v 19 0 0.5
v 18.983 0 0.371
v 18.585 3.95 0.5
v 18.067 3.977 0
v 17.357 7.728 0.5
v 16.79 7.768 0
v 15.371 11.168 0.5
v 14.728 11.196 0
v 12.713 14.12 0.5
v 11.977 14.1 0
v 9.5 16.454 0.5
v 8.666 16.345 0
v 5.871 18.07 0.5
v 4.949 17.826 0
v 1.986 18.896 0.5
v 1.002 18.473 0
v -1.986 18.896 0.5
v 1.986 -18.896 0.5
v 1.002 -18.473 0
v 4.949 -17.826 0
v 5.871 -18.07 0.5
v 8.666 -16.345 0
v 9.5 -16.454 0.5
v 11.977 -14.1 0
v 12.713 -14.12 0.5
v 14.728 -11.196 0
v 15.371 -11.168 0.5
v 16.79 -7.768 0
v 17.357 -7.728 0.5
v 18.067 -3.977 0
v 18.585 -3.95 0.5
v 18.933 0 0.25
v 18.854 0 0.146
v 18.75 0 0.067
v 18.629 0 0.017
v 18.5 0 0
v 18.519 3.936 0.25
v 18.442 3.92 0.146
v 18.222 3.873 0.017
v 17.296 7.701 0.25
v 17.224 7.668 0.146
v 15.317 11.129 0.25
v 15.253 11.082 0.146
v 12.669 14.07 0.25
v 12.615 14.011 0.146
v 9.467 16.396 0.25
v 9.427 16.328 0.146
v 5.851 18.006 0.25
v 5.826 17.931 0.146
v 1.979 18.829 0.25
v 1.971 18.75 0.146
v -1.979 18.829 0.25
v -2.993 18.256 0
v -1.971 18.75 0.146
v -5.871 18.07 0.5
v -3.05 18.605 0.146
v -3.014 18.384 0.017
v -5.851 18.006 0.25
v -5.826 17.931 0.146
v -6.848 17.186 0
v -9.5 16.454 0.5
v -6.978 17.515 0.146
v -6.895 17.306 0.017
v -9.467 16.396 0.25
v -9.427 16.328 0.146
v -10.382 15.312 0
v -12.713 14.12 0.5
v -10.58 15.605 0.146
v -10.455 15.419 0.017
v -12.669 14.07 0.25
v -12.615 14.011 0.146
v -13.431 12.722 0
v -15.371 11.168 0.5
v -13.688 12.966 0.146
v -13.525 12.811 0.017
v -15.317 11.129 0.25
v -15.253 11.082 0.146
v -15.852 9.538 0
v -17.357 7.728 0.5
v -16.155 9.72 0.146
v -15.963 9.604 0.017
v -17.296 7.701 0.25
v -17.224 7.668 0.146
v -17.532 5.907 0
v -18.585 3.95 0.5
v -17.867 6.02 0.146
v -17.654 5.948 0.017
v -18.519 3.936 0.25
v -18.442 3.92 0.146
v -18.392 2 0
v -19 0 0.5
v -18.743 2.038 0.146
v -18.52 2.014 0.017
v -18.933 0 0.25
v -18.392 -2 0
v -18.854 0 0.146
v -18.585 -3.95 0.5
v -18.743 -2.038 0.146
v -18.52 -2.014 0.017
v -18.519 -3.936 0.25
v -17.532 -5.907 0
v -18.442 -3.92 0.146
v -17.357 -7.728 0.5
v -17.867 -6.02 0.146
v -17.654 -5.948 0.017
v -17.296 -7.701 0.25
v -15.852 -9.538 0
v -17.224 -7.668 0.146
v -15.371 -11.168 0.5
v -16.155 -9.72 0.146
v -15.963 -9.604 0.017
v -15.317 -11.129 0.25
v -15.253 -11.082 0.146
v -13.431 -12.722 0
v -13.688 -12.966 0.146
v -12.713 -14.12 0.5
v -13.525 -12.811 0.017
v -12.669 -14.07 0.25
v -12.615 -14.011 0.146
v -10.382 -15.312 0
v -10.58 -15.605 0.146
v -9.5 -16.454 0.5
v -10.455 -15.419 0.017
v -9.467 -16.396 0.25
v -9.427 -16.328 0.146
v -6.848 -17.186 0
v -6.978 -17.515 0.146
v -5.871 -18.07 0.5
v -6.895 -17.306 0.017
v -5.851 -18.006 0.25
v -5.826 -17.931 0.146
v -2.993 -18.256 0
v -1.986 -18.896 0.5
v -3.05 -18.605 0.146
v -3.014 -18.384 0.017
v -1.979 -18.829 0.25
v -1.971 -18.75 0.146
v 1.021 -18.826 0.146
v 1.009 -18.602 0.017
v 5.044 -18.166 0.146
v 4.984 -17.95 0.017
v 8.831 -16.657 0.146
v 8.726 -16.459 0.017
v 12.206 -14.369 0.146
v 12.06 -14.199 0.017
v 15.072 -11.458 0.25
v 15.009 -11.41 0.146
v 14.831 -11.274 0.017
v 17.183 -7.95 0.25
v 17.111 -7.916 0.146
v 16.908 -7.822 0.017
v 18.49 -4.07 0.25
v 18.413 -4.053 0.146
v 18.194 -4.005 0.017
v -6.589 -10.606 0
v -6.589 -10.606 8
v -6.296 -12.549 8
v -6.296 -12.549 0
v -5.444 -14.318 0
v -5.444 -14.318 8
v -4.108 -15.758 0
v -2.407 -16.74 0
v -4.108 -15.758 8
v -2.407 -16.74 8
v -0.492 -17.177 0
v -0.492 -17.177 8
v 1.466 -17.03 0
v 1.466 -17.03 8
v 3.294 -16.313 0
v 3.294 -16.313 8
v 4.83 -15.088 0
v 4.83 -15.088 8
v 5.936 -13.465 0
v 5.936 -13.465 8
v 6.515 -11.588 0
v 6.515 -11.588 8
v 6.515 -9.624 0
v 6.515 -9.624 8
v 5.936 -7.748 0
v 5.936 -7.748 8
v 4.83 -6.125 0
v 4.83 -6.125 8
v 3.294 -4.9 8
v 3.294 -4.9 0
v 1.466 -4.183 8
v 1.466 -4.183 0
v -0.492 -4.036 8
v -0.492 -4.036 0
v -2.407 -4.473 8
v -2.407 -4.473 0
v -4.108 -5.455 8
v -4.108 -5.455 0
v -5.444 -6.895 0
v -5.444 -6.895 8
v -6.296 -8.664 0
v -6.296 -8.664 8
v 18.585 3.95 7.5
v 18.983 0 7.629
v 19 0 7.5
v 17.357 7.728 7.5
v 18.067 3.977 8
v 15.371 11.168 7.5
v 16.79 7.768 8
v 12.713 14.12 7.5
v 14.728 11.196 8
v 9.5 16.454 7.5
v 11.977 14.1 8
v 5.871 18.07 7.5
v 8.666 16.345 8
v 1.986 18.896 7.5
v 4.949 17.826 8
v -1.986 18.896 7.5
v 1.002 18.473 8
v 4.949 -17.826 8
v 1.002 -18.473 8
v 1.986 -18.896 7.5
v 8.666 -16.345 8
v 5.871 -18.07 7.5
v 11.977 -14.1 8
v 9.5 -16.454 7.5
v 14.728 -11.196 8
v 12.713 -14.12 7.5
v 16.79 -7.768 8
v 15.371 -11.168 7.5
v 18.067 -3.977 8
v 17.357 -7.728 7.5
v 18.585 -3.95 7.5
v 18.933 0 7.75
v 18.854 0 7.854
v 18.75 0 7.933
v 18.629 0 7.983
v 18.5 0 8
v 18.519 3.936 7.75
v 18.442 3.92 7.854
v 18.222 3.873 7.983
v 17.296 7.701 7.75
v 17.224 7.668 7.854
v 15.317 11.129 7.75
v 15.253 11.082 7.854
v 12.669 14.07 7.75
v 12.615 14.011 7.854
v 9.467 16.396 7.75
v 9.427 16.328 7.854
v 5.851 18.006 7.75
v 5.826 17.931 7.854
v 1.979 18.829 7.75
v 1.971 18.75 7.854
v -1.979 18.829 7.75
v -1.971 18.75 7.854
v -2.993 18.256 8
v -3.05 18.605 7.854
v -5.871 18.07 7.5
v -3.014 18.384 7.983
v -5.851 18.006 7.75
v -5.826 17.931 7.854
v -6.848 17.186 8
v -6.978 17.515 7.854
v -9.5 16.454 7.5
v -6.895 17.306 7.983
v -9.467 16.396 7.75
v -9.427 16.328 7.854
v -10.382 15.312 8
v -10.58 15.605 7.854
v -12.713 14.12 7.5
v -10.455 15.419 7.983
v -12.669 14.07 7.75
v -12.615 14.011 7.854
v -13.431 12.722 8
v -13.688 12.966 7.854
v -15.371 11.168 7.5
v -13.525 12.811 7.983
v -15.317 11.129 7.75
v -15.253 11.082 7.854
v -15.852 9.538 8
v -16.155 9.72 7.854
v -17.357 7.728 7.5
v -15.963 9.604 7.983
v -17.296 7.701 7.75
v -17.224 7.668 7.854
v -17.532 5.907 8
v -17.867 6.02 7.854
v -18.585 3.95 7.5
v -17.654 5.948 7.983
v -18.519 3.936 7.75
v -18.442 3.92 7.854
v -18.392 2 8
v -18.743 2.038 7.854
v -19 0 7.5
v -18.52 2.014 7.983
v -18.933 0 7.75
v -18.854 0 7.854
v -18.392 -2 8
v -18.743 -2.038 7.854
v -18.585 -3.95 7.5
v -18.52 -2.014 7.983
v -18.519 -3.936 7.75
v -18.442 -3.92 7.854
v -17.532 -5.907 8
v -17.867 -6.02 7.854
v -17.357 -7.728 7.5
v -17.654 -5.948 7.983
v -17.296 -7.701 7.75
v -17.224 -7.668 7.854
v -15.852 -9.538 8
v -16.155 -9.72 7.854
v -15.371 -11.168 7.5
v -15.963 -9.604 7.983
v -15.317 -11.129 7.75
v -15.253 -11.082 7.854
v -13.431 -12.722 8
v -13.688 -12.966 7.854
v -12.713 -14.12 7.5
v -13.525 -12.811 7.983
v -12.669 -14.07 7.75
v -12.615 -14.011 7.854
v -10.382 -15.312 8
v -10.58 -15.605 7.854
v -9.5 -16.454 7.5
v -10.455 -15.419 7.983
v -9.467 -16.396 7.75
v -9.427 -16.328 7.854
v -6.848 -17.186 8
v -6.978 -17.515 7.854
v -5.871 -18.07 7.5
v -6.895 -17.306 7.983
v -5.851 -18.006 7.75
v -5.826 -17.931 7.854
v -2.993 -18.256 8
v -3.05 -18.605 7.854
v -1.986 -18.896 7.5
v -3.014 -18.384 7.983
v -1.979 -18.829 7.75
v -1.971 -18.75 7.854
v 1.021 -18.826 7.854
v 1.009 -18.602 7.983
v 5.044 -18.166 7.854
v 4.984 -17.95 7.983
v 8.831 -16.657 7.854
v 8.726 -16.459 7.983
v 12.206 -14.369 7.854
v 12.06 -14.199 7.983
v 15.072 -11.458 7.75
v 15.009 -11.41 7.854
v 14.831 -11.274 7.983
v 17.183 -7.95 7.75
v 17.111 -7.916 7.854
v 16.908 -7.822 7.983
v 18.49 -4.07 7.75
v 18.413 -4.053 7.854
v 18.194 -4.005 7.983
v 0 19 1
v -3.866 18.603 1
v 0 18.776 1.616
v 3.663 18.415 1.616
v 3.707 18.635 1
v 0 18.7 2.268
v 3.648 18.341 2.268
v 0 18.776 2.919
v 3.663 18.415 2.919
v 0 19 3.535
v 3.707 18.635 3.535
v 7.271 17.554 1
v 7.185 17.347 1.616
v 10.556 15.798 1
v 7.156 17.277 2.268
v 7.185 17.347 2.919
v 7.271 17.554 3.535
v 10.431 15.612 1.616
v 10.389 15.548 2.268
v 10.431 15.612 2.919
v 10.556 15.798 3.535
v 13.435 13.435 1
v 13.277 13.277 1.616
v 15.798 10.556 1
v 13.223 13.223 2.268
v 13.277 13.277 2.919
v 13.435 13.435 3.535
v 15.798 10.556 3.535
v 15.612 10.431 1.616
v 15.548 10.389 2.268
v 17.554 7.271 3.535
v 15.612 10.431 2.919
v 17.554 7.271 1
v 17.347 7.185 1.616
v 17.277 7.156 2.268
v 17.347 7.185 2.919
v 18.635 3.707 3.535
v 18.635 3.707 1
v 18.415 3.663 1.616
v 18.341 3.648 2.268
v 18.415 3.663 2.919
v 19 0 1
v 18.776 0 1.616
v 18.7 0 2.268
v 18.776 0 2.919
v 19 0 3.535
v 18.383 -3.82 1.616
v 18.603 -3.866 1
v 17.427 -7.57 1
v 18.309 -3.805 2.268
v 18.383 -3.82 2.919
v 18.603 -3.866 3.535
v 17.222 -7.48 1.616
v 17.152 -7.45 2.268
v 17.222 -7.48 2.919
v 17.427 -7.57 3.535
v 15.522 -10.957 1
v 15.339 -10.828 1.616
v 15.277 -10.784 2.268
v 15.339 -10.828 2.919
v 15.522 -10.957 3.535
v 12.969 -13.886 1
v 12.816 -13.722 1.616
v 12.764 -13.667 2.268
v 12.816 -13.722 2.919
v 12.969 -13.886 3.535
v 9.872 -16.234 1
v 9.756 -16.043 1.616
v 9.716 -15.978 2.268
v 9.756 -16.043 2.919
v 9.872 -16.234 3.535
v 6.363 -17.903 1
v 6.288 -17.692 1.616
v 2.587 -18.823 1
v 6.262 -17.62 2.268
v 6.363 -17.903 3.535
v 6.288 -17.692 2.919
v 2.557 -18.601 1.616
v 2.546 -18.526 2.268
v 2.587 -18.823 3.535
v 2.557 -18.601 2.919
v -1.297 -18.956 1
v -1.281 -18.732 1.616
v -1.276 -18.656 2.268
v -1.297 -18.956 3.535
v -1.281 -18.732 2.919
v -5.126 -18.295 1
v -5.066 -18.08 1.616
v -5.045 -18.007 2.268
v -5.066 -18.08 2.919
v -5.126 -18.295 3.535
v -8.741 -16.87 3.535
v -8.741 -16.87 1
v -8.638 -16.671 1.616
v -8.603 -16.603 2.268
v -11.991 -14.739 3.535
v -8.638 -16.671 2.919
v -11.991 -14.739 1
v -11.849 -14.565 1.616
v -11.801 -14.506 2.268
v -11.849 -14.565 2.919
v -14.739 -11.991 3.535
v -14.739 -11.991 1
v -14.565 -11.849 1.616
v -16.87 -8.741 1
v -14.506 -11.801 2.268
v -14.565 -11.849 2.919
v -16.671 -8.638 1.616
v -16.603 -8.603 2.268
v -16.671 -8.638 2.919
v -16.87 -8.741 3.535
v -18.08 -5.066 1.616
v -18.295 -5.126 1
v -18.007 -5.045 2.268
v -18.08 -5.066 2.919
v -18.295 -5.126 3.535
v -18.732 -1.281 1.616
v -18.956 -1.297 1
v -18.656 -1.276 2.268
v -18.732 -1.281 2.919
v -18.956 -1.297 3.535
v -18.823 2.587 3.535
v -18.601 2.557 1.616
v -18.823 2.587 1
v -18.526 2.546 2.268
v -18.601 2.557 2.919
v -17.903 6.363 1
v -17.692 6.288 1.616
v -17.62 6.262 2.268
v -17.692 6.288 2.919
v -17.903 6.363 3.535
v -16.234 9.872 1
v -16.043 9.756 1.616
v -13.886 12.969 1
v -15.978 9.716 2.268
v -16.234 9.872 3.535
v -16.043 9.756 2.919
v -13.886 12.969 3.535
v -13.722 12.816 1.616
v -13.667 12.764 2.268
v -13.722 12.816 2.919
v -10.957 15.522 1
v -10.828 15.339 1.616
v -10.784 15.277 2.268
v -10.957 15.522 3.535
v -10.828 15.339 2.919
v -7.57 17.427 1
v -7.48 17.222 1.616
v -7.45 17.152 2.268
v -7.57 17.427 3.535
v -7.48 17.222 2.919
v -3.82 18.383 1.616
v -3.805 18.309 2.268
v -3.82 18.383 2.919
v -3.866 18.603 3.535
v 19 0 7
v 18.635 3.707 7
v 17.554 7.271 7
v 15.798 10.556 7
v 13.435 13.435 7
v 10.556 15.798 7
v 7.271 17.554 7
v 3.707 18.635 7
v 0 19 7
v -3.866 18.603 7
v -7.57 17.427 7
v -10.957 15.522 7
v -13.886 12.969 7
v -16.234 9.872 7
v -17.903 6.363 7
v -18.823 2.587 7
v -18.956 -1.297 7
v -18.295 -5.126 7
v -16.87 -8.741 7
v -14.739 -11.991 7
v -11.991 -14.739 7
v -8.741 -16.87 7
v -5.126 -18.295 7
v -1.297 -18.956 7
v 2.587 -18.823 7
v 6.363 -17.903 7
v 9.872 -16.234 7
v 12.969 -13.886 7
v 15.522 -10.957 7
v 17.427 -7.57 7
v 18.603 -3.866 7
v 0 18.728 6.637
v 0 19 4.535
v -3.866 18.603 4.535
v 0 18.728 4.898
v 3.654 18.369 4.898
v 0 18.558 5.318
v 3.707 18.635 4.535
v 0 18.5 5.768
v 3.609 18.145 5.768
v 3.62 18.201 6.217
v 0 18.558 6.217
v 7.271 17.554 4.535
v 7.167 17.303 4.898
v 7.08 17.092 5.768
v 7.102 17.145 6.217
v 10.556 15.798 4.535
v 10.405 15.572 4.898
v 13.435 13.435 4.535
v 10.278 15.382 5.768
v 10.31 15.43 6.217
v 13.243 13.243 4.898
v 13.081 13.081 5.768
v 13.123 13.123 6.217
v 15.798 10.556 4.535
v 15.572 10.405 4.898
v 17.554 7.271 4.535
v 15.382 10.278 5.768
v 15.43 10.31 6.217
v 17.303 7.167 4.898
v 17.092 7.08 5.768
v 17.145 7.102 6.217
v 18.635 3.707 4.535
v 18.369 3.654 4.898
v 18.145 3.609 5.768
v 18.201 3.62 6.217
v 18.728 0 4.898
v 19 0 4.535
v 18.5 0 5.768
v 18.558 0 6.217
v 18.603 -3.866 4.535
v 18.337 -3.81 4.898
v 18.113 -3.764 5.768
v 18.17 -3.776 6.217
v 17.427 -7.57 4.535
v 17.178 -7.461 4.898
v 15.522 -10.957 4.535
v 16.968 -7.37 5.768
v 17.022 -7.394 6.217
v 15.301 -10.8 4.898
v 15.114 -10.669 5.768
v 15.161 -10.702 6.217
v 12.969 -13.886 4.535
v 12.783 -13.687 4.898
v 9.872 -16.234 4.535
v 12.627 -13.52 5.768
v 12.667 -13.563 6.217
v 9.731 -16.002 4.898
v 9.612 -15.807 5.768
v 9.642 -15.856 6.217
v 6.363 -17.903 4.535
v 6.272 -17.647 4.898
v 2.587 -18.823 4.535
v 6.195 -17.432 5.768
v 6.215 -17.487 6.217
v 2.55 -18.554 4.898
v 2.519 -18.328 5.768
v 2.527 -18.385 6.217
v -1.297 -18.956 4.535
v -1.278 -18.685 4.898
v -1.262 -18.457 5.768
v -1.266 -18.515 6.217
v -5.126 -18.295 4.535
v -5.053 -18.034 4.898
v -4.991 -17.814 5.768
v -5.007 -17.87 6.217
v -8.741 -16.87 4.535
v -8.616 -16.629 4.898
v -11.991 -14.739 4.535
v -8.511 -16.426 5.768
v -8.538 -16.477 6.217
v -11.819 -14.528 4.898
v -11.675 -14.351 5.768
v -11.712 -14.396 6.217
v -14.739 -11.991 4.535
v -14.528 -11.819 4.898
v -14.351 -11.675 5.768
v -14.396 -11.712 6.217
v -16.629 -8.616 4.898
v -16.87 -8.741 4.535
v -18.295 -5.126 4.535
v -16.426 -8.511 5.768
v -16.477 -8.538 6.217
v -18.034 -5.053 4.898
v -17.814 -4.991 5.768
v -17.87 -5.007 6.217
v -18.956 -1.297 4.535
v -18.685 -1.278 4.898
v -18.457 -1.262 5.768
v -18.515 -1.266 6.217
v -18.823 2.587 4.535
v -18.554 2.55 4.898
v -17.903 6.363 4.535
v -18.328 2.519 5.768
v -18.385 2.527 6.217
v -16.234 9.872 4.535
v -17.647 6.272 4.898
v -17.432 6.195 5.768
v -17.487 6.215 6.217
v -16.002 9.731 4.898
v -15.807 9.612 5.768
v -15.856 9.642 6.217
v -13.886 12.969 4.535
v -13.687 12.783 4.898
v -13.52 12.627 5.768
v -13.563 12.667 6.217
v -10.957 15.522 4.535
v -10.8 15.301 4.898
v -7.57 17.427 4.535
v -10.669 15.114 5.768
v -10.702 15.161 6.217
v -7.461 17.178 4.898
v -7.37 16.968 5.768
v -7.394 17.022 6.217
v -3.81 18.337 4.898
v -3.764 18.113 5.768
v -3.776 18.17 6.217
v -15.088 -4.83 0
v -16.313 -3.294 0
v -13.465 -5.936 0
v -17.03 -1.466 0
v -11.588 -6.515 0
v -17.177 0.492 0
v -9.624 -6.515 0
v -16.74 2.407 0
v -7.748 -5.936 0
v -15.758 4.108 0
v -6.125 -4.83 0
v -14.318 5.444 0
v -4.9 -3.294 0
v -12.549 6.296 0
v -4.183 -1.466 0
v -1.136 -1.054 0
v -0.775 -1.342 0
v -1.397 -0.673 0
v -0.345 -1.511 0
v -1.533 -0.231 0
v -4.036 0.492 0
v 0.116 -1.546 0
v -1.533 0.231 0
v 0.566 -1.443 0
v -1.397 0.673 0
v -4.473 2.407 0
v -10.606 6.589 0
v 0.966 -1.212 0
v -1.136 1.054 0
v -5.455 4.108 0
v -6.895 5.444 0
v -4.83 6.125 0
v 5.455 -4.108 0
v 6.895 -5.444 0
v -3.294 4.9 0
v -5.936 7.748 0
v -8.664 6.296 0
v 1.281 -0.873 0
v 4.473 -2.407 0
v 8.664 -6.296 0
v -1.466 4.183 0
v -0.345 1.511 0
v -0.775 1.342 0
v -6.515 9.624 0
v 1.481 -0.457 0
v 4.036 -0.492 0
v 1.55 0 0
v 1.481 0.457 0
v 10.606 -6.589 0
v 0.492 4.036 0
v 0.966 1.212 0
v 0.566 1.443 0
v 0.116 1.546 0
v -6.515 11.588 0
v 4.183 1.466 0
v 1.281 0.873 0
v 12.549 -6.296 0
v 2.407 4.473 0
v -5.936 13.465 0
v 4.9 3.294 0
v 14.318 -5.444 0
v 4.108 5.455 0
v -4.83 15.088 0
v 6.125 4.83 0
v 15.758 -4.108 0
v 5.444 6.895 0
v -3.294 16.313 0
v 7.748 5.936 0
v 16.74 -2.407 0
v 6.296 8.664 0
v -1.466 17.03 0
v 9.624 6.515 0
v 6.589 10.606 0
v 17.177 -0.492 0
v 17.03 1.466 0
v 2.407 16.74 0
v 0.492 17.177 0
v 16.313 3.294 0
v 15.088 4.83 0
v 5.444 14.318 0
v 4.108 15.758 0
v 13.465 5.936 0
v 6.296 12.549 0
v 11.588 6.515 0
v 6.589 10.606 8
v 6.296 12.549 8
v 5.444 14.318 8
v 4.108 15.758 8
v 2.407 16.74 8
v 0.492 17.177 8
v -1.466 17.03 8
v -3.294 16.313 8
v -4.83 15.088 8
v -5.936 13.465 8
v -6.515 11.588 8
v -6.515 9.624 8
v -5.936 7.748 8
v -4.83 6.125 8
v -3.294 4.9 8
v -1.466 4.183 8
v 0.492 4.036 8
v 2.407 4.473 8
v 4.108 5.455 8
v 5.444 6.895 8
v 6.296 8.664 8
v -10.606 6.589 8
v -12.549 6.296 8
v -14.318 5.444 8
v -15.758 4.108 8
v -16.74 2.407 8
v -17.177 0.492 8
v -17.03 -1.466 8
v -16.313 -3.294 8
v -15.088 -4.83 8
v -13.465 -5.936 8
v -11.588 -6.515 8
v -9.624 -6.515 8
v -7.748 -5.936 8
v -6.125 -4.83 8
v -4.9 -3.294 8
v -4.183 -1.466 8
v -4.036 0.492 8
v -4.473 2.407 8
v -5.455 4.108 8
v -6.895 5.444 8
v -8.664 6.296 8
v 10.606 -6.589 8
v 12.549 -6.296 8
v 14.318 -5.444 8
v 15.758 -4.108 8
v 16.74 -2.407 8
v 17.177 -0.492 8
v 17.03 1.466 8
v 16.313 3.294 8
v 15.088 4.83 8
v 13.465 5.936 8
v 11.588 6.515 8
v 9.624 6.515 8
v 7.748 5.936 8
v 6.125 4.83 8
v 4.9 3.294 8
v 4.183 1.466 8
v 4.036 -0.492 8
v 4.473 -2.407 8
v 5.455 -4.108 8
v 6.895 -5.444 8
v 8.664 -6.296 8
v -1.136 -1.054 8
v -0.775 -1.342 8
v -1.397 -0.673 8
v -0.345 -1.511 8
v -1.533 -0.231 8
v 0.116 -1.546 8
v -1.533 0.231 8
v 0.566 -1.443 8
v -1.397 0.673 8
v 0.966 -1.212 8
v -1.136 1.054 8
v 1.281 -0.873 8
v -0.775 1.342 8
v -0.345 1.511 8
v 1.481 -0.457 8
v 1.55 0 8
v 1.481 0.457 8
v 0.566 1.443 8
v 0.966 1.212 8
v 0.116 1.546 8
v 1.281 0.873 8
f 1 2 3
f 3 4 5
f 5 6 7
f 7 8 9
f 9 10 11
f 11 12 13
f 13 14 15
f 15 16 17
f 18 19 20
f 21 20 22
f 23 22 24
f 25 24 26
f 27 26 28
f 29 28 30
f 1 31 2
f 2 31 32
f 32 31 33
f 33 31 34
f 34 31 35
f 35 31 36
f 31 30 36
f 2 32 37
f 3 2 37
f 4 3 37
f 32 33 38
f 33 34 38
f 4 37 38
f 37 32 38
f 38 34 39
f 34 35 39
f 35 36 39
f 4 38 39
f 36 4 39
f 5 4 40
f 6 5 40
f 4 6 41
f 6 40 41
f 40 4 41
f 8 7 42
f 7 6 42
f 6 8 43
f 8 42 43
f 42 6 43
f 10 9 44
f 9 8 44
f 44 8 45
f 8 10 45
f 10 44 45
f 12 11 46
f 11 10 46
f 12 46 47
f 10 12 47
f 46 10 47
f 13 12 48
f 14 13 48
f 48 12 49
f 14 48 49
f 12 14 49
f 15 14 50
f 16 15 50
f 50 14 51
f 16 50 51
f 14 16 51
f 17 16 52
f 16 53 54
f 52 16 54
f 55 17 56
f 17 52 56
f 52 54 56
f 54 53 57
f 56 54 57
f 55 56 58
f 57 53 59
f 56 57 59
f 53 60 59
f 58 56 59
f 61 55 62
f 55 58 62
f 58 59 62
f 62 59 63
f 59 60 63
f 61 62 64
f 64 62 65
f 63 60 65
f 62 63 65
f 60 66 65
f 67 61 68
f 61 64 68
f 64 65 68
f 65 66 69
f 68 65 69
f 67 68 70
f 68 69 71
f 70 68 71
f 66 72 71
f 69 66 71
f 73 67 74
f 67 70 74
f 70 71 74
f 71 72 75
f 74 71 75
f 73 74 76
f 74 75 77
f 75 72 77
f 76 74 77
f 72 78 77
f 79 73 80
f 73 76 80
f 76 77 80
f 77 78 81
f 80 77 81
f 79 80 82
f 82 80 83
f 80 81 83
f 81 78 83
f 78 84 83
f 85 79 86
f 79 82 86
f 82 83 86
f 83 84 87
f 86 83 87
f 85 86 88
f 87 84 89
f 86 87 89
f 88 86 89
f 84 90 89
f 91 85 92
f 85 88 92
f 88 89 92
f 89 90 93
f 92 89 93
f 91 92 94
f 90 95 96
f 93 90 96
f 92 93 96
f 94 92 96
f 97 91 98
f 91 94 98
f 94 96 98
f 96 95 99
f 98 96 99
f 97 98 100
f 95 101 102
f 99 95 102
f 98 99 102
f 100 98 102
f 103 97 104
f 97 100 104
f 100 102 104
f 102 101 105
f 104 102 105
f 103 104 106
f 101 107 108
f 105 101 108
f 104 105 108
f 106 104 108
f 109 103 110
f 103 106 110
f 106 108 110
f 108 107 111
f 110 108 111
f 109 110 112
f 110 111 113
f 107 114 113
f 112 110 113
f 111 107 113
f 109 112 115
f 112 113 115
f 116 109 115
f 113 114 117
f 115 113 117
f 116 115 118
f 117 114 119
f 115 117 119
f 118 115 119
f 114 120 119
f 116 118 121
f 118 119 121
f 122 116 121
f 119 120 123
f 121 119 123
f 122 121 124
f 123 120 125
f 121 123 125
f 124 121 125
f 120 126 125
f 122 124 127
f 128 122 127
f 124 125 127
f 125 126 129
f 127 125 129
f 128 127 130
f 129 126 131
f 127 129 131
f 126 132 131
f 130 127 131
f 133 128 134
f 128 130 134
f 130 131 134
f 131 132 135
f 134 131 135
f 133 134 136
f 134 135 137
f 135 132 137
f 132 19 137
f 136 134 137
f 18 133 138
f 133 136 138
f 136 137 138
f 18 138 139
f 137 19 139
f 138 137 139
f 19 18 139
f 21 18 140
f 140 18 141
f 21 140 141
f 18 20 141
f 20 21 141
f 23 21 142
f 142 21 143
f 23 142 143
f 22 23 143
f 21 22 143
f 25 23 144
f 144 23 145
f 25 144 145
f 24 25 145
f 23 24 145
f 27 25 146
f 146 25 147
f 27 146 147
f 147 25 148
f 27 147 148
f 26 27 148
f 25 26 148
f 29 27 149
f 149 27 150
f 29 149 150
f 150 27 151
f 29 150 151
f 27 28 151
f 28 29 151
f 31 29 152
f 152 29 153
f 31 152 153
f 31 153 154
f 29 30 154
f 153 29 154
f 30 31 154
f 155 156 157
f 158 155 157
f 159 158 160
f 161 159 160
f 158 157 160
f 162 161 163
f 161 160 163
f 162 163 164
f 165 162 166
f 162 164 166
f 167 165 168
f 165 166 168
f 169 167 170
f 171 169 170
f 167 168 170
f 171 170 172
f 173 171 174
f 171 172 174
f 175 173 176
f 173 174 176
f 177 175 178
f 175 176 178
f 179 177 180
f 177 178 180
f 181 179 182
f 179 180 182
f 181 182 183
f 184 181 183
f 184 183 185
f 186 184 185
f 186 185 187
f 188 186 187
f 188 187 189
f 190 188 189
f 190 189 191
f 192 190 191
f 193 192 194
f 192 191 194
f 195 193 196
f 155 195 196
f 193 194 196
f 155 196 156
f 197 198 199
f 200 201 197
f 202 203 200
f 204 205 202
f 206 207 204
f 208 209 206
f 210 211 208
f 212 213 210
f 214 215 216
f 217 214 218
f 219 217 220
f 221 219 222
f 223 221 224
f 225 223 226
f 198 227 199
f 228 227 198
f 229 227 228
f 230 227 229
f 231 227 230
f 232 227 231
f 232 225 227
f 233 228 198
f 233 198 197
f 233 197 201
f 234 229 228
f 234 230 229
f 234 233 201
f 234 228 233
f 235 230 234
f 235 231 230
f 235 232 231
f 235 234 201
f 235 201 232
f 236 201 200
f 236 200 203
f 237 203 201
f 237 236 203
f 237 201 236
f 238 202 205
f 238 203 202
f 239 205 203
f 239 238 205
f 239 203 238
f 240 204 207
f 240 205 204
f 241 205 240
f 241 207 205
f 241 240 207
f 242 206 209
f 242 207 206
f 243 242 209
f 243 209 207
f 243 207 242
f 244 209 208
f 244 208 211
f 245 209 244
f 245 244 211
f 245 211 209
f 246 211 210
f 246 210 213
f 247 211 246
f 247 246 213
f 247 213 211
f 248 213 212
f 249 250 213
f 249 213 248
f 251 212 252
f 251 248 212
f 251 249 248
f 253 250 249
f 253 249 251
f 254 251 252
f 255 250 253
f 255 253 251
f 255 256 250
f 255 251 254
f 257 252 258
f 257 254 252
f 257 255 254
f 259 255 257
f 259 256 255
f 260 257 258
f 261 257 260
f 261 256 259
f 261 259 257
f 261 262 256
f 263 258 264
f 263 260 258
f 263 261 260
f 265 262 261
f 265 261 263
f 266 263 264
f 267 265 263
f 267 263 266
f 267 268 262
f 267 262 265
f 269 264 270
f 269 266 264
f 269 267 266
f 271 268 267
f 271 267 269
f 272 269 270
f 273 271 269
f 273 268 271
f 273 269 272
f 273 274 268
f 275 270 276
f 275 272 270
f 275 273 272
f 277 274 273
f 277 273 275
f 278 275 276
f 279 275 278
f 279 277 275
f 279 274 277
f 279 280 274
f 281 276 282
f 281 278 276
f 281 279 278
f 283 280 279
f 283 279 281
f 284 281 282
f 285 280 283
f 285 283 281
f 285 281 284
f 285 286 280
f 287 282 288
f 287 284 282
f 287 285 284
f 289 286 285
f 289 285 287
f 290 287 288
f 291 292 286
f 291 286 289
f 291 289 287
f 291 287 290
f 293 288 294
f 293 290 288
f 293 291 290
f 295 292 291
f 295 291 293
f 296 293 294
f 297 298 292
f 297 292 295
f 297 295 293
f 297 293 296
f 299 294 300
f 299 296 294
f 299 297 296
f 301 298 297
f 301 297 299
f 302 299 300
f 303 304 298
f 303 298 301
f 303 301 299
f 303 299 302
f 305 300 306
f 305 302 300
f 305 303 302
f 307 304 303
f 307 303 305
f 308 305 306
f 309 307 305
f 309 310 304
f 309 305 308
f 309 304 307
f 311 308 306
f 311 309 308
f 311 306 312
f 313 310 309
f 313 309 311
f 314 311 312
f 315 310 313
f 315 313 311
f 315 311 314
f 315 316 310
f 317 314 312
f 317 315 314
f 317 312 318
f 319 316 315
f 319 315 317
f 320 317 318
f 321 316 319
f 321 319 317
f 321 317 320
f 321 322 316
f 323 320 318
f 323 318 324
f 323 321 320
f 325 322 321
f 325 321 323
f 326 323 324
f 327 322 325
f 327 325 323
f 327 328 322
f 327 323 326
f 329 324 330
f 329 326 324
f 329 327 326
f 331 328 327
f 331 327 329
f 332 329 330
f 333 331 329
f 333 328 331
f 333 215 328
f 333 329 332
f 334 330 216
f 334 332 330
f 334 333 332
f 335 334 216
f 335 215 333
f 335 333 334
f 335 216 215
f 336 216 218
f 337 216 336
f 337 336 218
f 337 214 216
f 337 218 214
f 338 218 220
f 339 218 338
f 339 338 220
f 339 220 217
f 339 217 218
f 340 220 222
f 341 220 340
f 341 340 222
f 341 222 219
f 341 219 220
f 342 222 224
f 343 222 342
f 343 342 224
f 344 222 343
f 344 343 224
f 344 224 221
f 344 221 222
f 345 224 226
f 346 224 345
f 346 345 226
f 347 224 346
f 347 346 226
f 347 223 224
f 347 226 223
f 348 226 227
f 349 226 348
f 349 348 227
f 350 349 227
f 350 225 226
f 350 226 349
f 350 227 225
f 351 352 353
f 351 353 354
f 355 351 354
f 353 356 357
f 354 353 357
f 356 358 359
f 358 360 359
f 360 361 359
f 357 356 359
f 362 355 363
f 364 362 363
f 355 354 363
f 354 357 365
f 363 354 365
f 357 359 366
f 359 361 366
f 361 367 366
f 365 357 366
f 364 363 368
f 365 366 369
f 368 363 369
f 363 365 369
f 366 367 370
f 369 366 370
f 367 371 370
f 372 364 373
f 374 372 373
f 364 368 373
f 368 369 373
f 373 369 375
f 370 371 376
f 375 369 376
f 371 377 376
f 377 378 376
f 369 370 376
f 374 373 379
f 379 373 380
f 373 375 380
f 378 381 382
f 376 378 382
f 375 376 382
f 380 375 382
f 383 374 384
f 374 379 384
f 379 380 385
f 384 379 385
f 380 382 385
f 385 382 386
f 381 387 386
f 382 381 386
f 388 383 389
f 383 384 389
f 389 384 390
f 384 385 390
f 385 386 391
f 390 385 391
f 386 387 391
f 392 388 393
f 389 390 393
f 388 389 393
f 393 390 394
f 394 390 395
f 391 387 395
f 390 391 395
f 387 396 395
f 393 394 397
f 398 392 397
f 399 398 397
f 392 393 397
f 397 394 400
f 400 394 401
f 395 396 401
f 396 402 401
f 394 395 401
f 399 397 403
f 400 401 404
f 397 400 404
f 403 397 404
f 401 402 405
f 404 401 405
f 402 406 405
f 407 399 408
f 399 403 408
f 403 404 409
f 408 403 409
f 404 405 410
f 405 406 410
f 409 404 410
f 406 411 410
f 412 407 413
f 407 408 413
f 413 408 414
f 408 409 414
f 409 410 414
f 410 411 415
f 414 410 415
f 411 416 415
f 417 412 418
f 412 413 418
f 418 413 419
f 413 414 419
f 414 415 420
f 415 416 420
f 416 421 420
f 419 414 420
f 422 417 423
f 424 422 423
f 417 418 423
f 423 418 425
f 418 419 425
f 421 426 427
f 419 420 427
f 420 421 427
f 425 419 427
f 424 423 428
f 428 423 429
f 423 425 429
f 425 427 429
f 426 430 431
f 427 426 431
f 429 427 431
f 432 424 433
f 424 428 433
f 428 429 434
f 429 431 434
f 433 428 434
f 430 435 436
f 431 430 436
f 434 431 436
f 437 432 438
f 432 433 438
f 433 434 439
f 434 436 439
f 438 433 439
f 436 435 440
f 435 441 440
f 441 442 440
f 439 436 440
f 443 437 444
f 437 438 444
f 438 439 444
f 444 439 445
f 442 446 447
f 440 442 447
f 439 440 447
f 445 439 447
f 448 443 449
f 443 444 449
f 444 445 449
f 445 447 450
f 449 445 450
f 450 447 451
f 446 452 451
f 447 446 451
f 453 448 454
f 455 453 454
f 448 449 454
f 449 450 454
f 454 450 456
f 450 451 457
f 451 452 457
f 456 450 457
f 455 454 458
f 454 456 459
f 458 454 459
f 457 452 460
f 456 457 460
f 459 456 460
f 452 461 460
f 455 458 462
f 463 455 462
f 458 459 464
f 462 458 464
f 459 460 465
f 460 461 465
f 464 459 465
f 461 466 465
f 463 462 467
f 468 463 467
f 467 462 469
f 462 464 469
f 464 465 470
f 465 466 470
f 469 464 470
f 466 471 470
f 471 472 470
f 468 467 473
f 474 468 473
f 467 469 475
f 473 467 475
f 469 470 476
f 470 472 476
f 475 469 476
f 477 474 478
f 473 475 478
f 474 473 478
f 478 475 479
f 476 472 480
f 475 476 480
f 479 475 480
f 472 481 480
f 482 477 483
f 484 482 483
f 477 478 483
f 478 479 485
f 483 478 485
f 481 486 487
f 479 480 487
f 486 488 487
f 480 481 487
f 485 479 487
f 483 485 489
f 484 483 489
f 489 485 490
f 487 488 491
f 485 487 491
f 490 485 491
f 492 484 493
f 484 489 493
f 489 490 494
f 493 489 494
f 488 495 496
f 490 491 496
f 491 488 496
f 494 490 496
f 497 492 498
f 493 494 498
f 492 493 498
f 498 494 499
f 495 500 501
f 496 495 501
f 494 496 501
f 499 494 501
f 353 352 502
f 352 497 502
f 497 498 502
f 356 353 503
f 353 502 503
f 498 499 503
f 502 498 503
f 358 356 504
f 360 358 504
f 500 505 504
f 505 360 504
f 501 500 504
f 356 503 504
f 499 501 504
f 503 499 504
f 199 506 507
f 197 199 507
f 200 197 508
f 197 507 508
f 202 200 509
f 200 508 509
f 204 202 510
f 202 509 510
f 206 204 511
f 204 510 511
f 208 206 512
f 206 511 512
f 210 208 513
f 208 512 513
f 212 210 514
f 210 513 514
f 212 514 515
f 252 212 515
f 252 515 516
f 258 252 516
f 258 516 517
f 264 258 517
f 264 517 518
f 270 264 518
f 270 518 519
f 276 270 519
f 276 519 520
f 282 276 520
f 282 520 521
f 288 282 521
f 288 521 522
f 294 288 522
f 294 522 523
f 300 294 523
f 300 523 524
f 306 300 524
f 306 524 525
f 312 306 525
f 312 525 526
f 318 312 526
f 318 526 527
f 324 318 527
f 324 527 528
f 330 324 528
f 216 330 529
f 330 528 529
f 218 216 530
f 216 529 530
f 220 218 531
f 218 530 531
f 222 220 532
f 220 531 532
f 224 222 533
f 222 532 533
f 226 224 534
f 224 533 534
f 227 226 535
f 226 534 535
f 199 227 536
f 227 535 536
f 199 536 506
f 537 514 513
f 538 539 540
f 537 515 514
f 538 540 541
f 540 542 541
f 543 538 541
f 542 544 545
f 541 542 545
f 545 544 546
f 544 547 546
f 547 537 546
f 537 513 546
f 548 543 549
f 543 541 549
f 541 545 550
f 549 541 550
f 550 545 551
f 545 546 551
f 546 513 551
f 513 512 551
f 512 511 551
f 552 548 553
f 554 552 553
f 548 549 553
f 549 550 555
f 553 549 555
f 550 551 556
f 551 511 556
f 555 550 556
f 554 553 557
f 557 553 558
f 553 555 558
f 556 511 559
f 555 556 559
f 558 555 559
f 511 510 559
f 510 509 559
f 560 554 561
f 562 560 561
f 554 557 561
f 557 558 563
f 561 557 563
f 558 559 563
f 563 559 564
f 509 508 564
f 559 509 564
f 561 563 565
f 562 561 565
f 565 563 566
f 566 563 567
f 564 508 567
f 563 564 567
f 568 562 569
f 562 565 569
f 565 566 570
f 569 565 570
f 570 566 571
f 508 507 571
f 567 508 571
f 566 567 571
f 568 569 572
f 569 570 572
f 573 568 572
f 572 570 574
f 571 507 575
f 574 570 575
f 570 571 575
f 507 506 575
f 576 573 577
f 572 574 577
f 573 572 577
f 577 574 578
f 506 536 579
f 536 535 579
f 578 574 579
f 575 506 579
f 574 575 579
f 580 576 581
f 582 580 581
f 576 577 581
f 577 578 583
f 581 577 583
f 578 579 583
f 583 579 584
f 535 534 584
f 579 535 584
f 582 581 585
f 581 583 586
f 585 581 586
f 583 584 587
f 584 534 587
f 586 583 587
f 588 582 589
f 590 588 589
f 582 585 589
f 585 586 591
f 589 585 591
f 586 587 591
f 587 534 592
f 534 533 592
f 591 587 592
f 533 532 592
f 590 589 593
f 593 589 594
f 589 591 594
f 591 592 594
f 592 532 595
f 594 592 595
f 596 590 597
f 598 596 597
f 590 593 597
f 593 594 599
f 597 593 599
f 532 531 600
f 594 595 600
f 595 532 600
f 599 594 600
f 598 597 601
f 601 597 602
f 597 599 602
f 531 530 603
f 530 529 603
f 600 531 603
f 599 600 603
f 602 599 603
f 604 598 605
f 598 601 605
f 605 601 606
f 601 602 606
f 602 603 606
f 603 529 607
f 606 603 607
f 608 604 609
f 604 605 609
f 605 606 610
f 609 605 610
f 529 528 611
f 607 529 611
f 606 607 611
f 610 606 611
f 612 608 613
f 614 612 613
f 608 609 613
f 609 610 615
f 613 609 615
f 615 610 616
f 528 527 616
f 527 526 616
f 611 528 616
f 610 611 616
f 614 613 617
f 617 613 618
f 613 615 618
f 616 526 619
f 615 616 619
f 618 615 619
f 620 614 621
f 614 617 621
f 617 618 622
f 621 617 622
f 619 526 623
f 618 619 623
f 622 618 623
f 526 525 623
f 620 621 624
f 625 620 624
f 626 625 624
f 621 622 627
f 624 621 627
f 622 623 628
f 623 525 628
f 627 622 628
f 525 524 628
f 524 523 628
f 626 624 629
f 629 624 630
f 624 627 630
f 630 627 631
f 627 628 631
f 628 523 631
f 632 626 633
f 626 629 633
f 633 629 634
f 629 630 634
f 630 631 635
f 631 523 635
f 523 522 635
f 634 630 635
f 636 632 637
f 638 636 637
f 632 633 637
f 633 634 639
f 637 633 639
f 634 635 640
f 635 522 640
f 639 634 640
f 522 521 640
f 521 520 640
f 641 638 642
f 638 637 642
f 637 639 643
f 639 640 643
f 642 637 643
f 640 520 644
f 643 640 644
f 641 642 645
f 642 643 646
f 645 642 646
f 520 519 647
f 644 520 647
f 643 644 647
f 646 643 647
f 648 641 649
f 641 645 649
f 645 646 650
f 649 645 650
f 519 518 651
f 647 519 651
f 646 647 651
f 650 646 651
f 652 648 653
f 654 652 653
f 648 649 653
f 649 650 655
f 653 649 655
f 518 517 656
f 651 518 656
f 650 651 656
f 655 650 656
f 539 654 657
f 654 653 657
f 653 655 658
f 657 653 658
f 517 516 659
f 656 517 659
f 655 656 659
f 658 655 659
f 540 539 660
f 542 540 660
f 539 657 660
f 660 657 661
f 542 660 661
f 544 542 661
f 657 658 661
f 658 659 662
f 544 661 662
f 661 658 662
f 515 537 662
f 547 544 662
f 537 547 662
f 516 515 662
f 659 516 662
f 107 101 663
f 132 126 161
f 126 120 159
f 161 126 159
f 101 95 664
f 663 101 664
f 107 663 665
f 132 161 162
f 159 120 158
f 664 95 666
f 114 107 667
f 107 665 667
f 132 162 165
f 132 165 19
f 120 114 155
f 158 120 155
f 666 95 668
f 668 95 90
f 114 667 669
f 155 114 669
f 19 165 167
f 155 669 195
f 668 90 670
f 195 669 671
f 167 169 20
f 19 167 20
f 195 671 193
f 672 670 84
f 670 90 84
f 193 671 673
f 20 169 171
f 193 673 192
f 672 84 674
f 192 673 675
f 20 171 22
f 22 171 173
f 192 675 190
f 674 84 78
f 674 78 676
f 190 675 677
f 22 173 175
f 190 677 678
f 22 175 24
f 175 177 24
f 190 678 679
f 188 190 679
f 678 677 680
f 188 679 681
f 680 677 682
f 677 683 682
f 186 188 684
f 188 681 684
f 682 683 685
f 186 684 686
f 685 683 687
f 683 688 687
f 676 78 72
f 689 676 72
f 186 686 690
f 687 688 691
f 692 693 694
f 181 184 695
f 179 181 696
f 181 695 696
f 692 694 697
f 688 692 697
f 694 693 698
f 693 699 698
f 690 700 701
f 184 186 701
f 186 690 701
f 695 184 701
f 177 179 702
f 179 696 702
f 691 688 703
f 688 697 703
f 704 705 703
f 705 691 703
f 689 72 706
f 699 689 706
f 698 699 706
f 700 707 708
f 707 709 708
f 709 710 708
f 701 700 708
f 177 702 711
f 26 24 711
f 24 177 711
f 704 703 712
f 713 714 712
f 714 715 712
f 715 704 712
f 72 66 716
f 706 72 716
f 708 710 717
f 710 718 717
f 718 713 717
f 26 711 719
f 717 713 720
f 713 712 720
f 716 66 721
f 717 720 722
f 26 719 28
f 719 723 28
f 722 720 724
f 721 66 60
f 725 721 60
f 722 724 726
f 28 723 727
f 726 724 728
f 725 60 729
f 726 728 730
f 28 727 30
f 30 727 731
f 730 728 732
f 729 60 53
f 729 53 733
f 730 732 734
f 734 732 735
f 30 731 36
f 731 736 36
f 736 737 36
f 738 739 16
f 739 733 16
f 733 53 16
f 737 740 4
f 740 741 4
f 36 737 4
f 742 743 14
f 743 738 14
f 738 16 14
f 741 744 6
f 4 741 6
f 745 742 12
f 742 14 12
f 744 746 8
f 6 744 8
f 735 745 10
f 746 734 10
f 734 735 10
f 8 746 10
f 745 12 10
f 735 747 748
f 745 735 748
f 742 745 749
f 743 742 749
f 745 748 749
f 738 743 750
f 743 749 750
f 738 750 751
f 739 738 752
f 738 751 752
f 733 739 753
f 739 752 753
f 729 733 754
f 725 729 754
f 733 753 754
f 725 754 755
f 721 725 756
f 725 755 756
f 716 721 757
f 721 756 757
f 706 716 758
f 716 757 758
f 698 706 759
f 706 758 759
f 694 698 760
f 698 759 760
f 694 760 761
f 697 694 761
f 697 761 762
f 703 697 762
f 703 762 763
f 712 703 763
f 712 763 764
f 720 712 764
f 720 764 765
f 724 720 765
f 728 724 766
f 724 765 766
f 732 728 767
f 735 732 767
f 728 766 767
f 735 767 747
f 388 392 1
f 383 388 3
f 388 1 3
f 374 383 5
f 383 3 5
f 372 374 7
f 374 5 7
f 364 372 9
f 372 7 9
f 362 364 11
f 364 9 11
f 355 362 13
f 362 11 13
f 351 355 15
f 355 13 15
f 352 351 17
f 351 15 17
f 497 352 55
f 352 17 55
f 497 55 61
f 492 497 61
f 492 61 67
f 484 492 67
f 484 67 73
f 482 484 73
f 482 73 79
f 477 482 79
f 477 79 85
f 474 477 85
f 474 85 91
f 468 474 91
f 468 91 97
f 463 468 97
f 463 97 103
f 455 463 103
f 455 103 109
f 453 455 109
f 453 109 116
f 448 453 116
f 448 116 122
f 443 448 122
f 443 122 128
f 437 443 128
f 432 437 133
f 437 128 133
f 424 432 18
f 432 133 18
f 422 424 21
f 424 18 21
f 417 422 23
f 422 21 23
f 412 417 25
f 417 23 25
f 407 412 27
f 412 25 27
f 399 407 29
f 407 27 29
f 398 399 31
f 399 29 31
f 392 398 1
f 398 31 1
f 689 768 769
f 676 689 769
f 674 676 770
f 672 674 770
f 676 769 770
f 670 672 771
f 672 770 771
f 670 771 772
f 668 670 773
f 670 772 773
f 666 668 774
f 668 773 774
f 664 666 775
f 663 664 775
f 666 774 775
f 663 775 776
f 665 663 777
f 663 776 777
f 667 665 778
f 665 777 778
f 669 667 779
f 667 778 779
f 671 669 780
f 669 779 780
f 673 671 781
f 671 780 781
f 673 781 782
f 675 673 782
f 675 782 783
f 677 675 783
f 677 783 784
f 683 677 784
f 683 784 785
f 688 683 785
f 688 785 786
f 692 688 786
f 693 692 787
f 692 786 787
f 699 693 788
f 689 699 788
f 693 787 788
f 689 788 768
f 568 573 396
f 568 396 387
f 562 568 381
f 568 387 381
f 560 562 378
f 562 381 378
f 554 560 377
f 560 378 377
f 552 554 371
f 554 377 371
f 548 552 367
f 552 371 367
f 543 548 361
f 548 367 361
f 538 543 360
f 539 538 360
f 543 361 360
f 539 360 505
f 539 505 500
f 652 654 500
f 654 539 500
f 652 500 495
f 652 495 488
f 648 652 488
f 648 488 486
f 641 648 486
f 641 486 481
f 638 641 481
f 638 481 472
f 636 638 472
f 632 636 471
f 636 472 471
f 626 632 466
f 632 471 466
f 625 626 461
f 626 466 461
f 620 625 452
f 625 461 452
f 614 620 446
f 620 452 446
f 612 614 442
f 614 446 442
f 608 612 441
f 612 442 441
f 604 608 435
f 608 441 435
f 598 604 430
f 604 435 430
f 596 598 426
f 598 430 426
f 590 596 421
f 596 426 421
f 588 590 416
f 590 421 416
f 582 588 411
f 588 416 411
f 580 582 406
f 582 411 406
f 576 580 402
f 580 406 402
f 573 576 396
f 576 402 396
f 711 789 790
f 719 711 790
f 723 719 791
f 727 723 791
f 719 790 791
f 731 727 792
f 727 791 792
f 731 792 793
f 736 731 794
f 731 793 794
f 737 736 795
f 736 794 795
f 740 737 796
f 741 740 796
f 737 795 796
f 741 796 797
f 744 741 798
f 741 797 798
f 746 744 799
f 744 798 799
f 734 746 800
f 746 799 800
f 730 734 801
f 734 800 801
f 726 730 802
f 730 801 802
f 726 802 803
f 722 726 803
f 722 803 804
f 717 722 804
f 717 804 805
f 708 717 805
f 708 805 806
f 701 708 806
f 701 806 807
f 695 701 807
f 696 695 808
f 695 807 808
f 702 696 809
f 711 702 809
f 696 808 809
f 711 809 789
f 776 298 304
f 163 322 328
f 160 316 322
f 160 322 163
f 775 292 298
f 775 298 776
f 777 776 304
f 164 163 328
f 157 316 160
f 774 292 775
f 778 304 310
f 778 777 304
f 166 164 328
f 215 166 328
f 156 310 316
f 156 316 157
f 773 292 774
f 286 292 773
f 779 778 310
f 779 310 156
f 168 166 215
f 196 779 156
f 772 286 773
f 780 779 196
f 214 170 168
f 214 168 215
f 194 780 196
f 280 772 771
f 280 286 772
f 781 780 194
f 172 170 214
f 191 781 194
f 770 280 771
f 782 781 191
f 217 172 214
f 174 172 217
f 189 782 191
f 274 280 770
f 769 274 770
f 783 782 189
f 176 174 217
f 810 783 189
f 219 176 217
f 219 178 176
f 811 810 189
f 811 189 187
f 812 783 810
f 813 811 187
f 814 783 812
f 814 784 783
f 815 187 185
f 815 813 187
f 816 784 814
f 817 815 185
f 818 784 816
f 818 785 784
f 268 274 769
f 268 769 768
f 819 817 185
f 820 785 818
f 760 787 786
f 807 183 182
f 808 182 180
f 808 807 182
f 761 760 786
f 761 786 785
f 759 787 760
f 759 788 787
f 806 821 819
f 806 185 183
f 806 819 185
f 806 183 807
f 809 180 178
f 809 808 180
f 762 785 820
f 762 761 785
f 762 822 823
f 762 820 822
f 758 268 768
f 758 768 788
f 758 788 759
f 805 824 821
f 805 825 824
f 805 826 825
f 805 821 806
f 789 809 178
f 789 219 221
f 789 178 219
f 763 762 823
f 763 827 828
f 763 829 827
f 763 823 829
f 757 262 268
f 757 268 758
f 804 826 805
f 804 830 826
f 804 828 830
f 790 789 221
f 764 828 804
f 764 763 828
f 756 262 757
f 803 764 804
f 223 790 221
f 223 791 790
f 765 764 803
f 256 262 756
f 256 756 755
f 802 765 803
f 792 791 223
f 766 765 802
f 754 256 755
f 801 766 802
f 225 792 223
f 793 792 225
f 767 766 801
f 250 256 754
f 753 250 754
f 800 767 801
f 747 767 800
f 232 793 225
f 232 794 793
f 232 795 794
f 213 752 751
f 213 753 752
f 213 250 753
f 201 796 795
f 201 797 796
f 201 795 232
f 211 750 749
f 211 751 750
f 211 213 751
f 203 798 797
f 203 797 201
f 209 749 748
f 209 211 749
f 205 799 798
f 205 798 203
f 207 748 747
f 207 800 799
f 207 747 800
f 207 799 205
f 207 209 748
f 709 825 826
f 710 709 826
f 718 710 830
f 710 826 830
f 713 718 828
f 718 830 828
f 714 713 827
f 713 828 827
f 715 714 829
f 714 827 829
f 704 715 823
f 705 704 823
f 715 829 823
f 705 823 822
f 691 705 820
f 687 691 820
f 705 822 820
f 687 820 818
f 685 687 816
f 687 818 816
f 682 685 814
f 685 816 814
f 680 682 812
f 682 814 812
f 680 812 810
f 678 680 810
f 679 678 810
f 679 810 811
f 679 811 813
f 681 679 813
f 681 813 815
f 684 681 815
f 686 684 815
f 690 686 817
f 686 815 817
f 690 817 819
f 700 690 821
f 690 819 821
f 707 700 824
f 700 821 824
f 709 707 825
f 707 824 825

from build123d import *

# Parameters (mm, degrees)
SKETCH1_R           = 19
BOSS_EXTRUDE1_DEPTH = 8
FILLET1_R           = 0.5
SKETCH3_R           = 1.55
CUT_EXTRUDE1_DEPTH  = 8
SKETCH4_R           = 6.58897104
CUT_EXTRUDE2_DEPTH  = 8
CIRPATTERN1_COUNT   = 4


with BuildPart() as part:
    # Sketch1 → Boss-Extrude1 (new body)
    with BuildSketch(Plane.XY):
        Circle(SKETCH1_R)
    extrude(amount=BOSS_EXTRUDE1_DEPTH)

    # Sketch2 → Cut-Revolve1 (revolve, cut)
    with BuildSketch(Plane(origin=(0, 0, 0), x_dir=(0, 0, -1), z_dir=(1, 0, 0))):
        with BuildLine():
            Line((-7, 19), (-4.535200691, 19))
            ThreePointArc((-4.535200691, 19), (-5.767600345, 18.5), (-7, 19))
        make_face()
        with BuildLine():
            Line((-3.535200691, 19), (-1, 19))
            ThreePointArc((-1, 19), (-2.267600345, 18.7), (-3.535200691, 19))
        make_face()
    revolve(axis=Axis((0, 0, 8.4), (0, 0, -1)), mode=Mode.SUBTRACT)

    # Fillet1
    fillet1_edges = [part.edges().sort_by_distance(p)[0] for p in [
        (-19, 0, 0),
        (-19, 0, 8),
    ]]
    fillet(fillet1_edges, radius=FILLET1_R)

    # Sketch3 → Cut-Extrude1 (cut)
    with BuildSketch(Plane.XY.offset(8)):
        Circle(SKETCH3_R)
    extrude(amount=-CUT_EXTRUDE1_DEPTH, mode=Mode.SUBTRACT)

    # Sketch4 → Cut-Extrude2 (cut)
    with BuildSketch(Plane.XY.offset(8)):
        with Locations((0, 10.60646011)):
            Circle(SKETCH4_R)
    cut_extrude2 = extrude(amount=-CUT_EXTRUDE2_DEPTH, mode=Mode.SUBTRACT)

    # CirPattern1: Cut-Extrude2 ×4 about axis
    cirpattern1_axis = Axis((0, 0, 0), (0, 0, 1))
    for i in range(1, CIRPATTERN1_COUNT):
        add(cut_extrude2.rotate(cirpattern1_axis, i * 360 / CIRPATTERN1_COUNT), mode=Mode.SUBTRACT)


solid = part.part
